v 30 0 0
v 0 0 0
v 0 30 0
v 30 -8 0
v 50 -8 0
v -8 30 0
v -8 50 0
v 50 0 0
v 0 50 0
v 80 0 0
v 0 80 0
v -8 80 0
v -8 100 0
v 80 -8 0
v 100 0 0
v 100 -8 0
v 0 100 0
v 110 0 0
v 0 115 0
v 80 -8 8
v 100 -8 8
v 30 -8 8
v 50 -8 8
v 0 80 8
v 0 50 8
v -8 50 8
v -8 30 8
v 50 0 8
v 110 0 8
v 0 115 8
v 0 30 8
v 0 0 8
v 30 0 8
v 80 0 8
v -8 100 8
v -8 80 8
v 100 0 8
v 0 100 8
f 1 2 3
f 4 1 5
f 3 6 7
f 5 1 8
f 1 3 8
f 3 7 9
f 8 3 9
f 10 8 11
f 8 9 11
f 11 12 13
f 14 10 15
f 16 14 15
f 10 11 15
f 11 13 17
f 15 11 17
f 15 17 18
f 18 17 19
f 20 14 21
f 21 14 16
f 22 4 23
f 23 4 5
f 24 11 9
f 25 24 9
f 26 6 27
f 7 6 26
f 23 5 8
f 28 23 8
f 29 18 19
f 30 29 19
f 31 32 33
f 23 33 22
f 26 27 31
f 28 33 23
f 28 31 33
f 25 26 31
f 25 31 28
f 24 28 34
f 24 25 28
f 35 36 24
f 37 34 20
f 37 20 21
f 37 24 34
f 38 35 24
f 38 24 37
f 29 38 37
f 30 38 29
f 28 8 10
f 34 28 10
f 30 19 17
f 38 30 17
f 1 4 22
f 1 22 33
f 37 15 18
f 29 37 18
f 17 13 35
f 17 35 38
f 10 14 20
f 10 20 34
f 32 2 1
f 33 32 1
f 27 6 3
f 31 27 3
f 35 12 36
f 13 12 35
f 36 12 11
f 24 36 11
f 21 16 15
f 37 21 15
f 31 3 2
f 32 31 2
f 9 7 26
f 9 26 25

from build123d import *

# Parameters (mm, degrees)
BOSS_EXTRU_1_DEPTH = 8
ESQUISSE2_W        = 8
ESQUISSE2_H        = 20
BOSS_EXTRU_2_DEPTH = 8
ESQUISSE3_W        = 20
ESQUISSE3_H        = 8
BOSS_EXTRU_3_DEPTH = 8


with BuildPart() as part:
    # Esquisse1 → Boss.-Extru.1 (new body)
    with BuildSketch(Plane.XY):
        Polygon((0, 0), (110, 0), (0, 115), align=None)
    extrude(amount=BOSS_EXTRU_1_DEPTH)

    # Esquisse2 → Boss.-Extru.2 (add)
    with BuildSketch(Plane.XY):
        with Locations((-4, 40)):
            Rectangle(ESQUISSE2_W, ESQUISSE2_H)
        with Locations((-4, 90)):
            Rectangle(ESQUISSE2_W, ESQUISSE2_H)
    extrude(amount=BOSS_EXTRU_2_DEPTH)

    # Esquisse3 → Boss.-Extru.3 (add)
    with BuildSketch(Plane.XY):
        with Locations((40, -4)):
            Rectangle(ESQUISSE3_W, ESQUISSE3_H)
        with Locations((90, -4)):
            Rectangle(ESQUISSE3_W, ESQUISSE3_H)
    extrude(amount=BOSS_EXTRU_3_DEPTH)


solid = part.part
